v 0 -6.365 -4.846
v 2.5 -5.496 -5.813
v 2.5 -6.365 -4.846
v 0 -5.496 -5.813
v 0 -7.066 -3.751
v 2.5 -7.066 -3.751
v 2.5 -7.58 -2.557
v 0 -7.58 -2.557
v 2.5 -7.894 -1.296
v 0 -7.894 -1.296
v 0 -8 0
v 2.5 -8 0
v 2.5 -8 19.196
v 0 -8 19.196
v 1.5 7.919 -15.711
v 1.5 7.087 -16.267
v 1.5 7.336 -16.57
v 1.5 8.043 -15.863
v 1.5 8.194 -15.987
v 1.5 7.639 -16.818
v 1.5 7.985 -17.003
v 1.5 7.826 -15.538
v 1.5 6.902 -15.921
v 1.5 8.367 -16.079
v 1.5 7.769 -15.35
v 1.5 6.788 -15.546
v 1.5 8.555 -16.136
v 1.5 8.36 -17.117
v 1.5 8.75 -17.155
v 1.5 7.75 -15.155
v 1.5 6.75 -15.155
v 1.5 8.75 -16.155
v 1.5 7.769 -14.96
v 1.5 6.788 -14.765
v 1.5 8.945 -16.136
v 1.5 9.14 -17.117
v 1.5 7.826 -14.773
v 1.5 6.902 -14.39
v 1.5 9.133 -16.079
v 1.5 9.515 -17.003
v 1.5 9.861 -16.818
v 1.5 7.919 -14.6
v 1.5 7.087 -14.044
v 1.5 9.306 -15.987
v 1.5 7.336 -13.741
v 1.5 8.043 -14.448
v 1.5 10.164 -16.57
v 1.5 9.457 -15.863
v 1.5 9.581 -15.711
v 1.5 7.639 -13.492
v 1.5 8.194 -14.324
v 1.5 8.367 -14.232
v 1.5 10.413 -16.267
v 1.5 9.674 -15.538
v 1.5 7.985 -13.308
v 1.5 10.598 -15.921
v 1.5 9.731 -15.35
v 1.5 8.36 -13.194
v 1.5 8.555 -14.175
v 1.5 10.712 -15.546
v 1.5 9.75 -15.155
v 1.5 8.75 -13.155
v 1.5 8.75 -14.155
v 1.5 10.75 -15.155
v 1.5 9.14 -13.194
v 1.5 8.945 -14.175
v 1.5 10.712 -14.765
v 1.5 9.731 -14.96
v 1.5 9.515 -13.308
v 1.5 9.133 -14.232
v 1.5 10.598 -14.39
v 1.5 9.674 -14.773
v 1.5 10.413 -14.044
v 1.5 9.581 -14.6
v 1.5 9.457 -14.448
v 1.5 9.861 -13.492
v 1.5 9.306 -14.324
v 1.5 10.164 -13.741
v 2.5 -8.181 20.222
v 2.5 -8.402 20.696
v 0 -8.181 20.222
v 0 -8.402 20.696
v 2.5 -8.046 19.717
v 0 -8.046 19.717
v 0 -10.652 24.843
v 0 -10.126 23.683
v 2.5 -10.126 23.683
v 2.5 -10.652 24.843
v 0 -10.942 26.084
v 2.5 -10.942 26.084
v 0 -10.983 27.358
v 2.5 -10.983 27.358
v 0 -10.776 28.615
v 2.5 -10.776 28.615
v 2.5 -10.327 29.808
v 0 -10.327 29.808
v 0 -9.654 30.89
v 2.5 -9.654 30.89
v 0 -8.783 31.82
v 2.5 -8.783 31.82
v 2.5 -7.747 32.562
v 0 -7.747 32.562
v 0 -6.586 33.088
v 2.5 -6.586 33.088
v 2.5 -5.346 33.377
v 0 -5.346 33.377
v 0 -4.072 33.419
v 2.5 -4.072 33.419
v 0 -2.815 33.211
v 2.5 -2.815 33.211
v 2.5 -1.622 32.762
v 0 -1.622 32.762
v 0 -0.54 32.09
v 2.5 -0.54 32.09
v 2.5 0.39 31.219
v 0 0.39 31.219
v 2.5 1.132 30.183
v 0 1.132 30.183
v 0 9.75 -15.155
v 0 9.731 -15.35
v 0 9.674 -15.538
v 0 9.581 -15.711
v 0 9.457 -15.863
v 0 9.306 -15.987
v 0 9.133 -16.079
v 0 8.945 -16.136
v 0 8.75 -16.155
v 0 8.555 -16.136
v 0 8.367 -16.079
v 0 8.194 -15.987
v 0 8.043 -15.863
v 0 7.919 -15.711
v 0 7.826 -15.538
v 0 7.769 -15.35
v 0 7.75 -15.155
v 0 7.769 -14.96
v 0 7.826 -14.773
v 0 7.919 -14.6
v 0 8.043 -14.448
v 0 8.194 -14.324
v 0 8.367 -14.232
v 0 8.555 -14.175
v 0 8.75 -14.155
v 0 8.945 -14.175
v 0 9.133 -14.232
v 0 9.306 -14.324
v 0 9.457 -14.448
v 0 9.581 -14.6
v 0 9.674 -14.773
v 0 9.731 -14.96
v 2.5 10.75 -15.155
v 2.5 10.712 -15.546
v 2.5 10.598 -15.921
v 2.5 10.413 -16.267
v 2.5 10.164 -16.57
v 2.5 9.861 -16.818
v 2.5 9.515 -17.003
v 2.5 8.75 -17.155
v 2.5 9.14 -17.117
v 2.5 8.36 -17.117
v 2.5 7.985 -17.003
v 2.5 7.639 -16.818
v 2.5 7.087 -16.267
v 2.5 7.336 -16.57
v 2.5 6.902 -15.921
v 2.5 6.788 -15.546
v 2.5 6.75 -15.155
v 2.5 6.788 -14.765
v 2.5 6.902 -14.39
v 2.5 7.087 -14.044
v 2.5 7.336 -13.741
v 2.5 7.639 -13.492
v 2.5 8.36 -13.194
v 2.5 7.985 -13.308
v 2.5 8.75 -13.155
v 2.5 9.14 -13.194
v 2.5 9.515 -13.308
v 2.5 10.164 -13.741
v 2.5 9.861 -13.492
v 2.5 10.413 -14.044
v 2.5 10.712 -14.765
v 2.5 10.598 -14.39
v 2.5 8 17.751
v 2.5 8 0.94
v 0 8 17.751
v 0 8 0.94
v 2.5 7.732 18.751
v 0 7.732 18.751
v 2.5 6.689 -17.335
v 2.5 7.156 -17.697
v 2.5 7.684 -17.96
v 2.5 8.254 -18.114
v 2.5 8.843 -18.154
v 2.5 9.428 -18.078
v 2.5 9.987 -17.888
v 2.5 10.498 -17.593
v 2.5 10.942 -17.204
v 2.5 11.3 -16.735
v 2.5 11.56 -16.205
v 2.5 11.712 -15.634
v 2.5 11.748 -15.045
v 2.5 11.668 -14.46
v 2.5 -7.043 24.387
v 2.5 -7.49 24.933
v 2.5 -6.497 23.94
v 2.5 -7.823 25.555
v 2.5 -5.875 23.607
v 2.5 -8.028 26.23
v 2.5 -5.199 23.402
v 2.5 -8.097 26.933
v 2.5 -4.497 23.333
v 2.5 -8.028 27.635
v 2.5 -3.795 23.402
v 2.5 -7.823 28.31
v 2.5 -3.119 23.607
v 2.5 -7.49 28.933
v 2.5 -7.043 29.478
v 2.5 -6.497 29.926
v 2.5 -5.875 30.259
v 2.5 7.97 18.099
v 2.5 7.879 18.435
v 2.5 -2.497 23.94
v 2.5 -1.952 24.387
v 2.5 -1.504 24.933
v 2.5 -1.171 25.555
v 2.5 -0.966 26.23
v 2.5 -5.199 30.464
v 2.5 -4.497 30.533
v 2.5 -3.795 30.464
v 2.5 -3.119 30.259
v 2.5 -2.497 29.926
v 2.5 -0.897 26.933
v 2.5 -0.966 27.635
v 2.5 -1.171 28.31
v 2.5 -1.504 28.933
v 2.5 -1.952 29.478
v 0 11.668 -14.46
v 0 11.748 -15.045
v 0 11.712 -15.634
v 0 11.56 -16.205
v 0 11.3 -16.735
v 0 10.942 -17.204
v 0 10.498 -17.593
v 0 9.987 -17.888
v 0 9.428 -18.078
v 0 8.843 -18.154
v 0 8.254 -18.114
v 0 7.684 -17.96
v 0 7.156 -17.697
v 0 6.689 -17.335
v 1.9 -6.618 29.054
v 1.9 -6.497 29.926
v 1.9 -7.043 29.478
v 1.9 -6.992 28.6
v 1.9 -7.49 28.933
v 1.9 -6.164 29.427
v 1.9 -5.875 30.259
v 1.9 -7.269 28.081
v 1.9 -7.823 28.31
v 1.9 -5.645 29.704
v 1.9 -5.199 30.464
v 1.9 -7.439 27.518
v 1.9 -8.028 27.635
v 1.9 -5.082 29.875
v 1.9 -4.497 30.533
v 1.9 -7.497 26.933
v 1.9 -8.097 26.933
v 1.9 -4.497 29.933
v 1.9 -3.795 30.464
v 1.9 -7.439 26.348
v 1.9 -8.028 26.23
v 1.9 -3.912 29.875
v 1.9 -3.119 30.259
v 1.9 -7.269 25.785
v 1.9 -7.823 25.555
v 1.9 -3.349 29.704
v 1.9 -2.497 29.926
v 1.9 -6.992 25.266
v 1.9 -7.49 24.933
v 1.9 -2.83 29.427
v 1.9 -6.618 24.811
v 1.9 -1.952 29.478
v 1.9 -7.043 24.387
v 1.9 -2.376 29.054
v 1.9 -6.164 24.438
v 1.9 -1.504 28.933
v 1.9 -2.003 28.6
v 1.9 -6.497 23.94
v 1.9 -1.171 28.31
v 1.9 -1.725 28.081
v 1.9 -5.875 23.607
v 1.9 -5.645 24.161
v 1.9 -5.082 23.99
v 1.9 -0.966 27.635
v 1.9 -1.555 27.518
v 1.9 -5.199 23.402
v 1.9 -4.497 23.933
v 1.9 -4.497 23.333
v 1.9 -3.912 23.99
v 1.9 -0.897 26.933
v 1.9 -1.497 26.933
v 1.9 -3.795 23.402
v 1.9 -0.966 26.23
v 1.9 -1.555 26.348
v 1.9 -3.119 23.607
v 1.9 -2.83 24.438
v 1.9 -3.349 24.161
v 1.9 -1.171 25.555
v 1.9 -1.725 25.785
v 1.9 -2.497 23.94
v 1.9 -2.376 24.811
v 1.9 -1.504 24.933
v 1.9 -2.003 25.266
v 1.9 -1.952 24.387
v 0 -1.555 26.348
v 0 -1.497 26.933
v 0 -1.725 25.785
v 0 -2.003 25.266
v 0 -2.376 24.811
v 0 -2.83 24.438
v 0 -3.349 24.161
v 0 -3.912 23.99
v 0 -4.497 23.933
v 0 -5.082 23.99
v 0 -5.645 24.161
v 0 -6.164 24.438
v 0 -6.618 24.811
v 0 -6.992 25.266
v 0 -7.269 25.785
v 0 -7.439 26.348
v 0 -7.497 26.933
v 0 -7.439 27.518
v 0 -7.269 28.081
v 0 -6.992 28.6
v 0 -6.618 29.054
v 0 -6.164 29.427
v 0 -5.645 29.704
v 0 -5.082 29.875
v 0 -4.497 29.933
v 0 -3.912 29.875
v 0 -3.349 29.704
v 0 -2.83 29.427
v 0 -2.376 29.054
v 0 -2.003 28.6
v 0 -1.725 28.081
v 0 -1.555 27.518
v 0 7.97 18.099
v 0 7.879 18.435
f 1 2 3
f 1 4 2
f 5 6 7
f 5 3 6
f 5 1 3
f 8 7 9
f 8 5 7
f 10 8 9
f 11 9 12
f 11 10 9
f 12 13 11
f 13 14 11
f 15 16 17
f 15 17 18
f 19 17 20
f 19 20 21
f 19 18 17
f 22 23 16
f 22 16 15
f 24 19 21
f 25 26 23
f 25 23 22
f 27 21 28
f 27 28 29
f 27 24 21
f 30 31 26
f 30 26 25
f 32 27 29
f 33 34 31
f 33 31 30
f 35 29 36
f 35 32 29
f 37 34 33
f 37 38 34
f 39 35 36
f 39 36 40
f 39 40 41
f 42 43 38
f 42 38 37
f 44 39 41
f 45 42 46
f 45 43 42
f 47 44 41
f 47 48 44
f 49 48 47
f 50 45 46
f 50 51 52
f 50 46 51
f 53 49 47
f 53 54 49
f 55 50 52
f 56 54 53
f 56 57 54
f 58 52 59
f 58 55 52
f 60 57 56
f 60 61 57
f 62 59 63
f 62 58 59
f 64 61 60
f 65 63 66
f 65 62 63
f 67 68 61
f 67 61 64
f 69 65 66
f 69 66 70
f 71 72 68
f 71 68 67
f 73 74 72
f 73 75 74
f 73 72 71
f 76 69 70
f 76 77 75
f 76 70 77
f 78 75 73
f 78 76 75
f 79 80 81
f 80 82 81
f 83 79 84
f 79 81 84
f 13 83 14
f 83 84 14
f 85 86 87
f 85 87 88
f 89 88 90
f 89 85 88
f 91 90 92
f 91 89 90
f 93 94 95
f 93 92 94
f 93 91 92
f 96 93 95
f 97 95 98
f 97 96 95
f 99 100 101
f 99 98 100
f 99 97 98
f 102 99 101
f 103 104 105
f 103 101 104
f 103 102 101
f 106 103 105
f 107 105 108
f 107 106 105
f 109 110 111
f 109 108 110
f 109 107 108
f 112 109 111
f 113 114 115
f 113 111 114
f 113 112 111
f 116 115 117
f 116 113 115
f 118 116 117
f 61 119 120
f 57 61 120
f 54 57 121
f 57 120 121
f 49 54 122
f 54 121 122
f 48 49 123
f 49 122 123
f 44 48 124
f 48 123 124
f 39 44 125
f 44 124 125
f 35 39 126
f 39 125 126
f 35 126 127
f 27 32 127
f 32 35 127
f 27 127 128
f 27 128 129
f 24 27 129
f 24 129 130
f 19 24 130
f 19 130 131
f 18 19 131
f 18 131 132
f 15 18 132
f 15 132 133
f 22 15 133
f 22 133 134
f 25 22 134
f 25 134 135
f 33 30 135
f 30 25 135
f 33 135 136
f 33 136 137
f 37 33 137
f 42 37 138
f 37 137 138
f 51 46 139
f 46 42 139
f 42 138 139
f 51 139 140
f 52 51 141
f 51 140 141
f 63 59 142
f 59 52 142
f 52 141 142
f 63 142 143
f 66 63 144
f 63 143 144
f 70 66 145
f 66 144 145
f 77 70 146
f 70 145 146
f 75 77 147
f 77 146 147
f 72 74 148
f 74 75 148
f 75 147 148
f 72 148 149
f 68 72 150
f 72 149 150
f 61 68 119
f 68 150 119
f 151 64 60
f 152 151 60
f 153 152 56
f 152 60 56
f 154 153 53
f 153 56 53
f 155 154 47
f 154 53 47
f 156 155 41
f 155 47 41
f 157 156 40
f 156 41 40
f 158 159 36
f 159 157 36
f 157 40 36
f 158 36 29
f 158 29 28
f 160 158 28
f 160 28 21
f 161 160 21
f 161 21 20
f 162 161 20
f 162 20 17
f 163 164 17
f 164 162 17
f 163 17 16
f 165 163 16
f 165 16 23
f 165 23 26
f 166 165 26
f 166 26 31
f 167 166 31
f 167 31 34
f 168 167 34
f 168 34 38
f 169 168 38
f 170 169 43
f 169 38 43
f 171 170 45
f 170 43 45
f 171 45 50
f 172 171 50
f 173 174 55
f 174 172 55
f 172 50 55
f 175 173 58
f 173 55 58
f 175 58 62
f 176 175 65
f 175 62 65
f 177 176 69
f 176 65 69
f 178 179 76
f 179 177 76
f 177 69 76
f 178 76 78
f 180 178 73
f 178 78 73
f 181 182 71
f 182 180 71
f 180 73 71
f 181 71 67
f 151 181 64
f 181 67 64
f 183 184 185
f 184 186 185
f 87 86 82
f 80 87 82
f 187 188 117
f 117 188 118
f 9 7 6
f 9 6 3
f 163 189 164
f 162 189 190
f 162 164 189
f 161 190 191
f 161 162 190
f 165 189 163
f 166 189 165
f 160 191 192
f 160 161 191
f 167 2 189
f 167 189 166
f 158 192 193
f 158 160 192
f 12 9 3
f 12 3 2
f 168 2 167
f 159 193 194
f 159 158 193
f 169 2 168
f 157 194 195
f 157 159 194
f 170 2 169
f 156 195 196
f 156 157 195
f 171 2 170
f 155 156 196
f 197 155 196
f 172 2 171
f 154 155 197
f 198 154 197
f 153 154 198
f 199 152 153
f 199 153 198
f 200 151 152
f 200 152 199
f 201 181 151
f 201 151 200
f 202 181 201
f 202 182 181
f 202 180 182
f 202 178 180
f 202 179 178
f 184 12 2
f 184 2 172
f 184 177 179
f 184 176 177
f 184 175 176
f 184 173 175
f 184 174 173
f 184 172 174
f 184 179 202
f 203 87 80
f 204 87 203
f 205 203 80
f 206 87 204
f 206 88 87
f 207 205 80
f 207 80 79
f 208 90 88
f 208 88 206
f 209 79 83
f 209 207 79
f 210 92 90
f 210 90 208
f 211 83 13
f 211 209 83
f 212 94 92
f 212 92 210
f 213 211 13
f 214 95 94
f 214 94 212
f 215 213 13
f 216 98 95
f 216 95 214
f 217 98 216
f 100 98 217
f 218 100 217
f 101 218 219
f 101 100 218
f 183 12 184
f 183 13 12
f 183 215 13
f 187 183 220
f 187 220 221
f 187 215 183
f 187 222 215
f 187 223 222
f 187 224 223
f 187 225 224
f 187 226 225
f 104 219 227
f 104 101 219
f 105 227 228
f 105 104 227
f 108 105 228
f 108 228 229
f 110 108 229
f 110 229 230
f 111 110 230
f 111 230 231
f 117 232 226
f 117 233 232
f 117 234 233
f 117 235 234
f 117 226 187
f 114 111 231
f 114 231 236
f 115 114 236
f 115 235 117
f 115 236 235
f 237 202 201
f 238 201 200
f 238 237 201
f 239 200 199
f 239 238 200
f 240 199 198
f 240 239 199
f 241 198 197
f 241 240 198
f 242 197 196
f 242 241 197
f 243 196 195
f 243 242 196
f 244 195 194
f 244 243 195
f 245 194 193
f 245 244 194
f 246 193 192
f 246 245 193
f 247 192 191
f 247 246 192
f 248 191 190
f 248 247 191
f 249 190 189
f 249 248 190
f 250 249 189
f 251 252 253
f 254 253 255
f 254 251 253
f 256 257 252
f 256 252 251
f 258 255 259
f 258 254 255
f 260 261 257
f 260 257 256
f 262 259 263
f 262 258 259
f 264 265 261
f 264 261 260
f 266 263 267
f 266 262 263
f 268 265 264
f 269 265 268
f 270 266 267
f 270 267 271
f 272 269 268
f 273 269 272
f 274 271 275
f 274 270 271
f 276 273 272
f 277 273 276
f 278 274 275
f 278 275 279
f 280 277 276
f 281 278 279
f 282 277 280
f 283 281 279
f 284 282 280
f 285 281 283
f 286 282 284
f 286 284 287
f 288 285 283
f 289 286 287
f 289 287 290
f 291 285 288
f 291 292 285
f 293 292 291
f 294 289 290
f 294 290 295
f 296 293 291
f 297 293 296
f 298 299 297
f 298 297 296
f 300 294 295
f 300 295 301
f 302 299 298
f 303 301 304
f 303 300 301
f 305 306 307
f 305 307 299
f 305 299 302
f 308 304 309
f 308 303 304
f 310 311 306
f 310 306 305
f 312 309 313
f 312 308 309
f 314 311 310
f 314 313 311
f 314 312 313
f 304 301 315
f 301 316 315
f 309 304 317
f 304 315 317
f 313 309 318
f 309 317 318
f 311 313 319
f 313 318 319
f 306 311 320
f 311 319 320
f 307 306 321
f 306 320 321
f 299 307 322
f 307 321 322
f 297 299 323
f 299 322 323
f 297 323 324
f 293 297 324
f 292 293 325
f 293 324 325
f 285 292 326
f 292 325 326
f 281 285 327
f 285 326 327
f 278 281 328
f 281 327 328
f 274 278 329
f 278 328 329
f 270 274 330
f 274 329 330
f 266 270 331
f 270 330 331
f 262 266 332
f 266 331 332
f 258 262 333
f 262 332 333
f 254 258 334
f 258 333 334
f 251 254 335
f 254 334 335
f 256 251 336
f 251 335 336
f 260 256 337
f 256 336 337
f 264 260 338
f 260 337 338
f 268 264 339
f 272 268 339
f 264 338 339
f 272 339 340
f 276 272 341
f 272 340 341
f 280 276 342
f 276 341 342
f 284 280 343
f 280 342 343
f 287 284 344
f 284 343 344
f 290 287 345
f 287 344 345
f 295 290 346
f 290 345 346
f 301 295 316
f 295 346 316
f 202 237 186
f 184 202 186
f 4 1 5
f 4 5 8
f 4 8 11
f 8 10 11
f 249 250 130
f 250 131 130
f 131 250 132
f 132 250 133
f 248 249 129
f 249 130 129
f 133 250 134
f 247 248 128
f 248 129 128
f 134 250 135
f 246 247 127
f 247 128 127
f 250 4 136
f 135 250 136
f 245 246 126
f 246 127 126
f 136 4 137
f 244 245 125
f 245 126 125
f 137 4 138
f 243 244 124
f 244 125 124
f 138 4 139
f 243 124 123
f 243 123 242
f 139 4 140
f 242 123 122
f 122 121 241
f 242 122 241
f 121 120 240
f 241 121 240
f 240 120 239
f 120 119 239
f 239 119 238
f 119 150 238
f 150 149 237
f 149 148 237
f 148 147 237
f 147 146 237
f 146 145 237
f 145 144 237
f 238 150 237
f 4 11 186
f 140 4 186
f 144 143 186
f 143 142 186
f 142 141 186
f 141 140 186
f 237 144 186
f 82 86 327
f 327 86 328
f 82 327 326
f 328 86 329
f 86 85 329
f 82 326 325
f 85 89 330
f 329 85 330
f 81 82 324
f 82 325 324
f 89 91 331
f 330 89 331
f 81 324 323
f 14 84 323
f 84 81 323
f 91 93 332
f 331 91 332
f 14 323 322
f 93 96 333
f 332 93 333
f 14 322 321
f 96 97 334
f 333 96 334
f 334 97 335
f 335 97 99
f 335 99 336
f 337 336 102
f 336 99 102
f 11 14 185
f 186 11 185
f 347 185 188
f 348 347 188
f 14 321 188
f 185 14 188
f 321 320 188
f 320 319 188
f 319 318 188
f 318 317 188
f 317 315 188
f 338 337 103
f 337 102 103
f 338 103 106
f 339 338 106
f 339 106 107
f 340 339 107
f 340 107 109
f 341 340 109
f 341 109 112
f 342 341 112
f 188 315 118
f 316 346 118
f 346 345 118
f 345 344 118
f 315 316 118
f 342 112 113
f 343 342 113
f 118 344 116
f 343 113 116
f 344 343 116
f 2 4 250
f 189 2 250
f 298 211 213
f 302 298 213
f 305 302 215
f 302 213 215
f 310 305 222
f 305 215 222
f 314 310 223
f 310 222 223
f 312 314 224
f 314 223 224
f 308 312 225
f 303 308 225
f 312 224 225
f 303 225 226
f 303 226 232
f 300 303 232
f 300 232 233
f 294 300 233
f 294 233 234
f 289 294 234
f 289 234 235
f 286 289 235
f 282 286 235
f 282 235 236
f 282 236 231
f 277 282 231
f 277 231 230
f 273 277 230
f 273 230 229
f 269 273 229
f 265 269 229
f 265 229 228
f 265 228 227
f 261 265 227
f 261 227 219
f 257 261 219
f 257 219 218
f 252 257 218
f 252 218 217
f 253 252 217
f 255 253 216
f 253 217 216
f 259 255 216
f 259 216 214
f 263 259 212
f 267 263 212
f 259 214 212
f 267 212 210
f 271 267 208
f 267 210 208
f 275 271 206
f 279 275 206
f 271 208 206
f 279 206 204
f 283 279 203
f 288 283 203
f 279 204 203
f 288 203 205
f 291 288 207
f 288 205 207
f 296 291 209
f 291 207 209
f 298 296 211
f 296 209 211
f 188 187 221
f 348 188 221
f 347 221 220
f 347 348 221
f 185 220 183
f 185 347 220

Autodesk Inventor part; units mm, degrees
ref_plane "YZ Plane" through (0, 0, 0) normal (1, 0, 0) x (0, 1, 0)
ref_plane "XZ Plane" through (0, 0, 0) normal (0, 1, 0) x (-1, 0, 0)
ref_plane "XY Plane" through (0, 0, 0) normal (0, 0, 1) x (1, 0, 0)
sketch "スケッチ1" plane through (0, 0, 0) normal (1, 0, 0) x (0, 1, 0)
  circle A0 centre (-4.4971, 26.9328) radius 3.6
  circle A1 centre (-4.4971, 26.9328) radius 3
  arc A2 (1.1321, 30.1828) -> (-10.1263, 23.6828) centre (-4.4971, 26.9328) ccw
  line L0 (-10.1263, 23.6828) -> (-8.4019, 20.6962)
  line L1 (-8, 19.1962) -> (-8, 0)
  line L2 (8, 0) -> (8, 17.7513)
  line L3 (7.7321, 18.7513) -> (1.1321, 30.1828)
  arc A3 (8, 17.7513) -> (7.7321, 18.7513) centre (6, 17.7513) ccw
  arc A4 (-8, 0) -> (8, 0) centre (0, 0) ccw
  circle A5 centre (0, 0) radius 2
  line L4 (-8, 20) -> (-8, 0) construction
  line L5 (-8, 0) -> (0, 0) construction
  line L6 (0, -28.9489) -> (0, 46.6055) construction
  arc A6 (-8, 19.1962) -> (-8.4019, 20.6962) centre (-11, 19.1962) ccw
  circle A7 centre (8.75, -15.1554) radius 3
  line L7 (0, 0) -> (8.75, -15.1554) construction
  circle A8 centre (0, 0) radius 8 construction
  line L8 (-5.4965, -5.8127) -> (6.6888, -17.3352)
  line L9 (11.6683, -14.4603) -> (7.7823, 1.8538)
  circle A9 centre (8.75, -15.1554) radius 2
  circle A10 centre (8.75, -15.1554) radius 1
  circle A11 centre (-4.4971, 26.9328) radius 5.5 construction
  line L10 (0.9991, 27.1358) -> (1.9986, 0.0738) construction
  line L11 (-9.7612, 25.3391) -> (-1.9142, -0.5795) construction
  point P0 (8, 18.2872)
  point P1 (8, 0.9397)
  point P2 (-5.4965, -5.8127)
  dimension "d0" = 6
  dimension "d1" = 7.2
  dimension "d2" = 6.5
  dimension "d9" = 2
  dimension "d13" = 150
  dimension "d14" = 8
  dimension "d15" = 4
  dimension "d18" = 13.2
  dimension "d19" = 8
  dimension "d20" = 20
  dimension "d26" = 3
  dimension "d55" = 6
  dimension "d56" = 17.5
  dimension "d58" = 30
  dimension "d59" = 16
  dimension "d60" = 4
  dimension "d61" = 2
  dimension "d75" = 11
extrude "押し出し3" add sketch "スケッチ1" along normal blind 2.5 contours A0 | L3 A3 L2 A4 L1 A6 L0 A2 | L9 A7 L8 A4 L2 | A7 | A5
sketch "スケッチ2" plane through (2.5, 0, 0) normal (1, 0, 0) x (0, 0, -1)
  line L0 (-0.9397, 8) -> (-17.7513, 8) projected
  arc A0 (-17.7513, 8) -> (-18.7513, 7.7321) centre (-17.7513, 6) ccw projected
  line L1 (-18.7513, 7.7321) -> (-30.1828, 1.1321) projected
  arc A1 (-30.1828, 1.1321) -> (-23.6828, -10.1263) centre (-26.9328, -4.4971) ccw projected
  line L2 (-23.6828, -10.1263) -> (-20.6962, -8.4019) projected
  arc A2 (-19.1962, -8) -> (-20.6962, -8.4019) centre (-19.1962, -11) ccw projected
  line L3 (-19.1962, -8) -> (0, -8) projected
  arc A3 (0, -8) -> (5.8127, -5.4965) centre (0, 0) ccw projected
  circle A4 centre (-26.9328, -4.4971) radius 3.6
  line L4 (5.8127, -5.4965) -> (17.3352, 6.6888) projected
  arc A5 (17.3352, 6.6888) -> (14.4603, 11.6683) centre (15.1554, 8.75) ccw projected
  line L5 (14.4603, 11.6683) -> (-0.9397, 8) projected
  dimension "d32" = 7.2
extrude "押し出し4" cut sketch "スケッチ2" against normal blind 0.6 contours A4
extrude "押し出し5" add sketch "スケッチ1" along normal blind 1.5 contours A9
properties part number "GearCover"
